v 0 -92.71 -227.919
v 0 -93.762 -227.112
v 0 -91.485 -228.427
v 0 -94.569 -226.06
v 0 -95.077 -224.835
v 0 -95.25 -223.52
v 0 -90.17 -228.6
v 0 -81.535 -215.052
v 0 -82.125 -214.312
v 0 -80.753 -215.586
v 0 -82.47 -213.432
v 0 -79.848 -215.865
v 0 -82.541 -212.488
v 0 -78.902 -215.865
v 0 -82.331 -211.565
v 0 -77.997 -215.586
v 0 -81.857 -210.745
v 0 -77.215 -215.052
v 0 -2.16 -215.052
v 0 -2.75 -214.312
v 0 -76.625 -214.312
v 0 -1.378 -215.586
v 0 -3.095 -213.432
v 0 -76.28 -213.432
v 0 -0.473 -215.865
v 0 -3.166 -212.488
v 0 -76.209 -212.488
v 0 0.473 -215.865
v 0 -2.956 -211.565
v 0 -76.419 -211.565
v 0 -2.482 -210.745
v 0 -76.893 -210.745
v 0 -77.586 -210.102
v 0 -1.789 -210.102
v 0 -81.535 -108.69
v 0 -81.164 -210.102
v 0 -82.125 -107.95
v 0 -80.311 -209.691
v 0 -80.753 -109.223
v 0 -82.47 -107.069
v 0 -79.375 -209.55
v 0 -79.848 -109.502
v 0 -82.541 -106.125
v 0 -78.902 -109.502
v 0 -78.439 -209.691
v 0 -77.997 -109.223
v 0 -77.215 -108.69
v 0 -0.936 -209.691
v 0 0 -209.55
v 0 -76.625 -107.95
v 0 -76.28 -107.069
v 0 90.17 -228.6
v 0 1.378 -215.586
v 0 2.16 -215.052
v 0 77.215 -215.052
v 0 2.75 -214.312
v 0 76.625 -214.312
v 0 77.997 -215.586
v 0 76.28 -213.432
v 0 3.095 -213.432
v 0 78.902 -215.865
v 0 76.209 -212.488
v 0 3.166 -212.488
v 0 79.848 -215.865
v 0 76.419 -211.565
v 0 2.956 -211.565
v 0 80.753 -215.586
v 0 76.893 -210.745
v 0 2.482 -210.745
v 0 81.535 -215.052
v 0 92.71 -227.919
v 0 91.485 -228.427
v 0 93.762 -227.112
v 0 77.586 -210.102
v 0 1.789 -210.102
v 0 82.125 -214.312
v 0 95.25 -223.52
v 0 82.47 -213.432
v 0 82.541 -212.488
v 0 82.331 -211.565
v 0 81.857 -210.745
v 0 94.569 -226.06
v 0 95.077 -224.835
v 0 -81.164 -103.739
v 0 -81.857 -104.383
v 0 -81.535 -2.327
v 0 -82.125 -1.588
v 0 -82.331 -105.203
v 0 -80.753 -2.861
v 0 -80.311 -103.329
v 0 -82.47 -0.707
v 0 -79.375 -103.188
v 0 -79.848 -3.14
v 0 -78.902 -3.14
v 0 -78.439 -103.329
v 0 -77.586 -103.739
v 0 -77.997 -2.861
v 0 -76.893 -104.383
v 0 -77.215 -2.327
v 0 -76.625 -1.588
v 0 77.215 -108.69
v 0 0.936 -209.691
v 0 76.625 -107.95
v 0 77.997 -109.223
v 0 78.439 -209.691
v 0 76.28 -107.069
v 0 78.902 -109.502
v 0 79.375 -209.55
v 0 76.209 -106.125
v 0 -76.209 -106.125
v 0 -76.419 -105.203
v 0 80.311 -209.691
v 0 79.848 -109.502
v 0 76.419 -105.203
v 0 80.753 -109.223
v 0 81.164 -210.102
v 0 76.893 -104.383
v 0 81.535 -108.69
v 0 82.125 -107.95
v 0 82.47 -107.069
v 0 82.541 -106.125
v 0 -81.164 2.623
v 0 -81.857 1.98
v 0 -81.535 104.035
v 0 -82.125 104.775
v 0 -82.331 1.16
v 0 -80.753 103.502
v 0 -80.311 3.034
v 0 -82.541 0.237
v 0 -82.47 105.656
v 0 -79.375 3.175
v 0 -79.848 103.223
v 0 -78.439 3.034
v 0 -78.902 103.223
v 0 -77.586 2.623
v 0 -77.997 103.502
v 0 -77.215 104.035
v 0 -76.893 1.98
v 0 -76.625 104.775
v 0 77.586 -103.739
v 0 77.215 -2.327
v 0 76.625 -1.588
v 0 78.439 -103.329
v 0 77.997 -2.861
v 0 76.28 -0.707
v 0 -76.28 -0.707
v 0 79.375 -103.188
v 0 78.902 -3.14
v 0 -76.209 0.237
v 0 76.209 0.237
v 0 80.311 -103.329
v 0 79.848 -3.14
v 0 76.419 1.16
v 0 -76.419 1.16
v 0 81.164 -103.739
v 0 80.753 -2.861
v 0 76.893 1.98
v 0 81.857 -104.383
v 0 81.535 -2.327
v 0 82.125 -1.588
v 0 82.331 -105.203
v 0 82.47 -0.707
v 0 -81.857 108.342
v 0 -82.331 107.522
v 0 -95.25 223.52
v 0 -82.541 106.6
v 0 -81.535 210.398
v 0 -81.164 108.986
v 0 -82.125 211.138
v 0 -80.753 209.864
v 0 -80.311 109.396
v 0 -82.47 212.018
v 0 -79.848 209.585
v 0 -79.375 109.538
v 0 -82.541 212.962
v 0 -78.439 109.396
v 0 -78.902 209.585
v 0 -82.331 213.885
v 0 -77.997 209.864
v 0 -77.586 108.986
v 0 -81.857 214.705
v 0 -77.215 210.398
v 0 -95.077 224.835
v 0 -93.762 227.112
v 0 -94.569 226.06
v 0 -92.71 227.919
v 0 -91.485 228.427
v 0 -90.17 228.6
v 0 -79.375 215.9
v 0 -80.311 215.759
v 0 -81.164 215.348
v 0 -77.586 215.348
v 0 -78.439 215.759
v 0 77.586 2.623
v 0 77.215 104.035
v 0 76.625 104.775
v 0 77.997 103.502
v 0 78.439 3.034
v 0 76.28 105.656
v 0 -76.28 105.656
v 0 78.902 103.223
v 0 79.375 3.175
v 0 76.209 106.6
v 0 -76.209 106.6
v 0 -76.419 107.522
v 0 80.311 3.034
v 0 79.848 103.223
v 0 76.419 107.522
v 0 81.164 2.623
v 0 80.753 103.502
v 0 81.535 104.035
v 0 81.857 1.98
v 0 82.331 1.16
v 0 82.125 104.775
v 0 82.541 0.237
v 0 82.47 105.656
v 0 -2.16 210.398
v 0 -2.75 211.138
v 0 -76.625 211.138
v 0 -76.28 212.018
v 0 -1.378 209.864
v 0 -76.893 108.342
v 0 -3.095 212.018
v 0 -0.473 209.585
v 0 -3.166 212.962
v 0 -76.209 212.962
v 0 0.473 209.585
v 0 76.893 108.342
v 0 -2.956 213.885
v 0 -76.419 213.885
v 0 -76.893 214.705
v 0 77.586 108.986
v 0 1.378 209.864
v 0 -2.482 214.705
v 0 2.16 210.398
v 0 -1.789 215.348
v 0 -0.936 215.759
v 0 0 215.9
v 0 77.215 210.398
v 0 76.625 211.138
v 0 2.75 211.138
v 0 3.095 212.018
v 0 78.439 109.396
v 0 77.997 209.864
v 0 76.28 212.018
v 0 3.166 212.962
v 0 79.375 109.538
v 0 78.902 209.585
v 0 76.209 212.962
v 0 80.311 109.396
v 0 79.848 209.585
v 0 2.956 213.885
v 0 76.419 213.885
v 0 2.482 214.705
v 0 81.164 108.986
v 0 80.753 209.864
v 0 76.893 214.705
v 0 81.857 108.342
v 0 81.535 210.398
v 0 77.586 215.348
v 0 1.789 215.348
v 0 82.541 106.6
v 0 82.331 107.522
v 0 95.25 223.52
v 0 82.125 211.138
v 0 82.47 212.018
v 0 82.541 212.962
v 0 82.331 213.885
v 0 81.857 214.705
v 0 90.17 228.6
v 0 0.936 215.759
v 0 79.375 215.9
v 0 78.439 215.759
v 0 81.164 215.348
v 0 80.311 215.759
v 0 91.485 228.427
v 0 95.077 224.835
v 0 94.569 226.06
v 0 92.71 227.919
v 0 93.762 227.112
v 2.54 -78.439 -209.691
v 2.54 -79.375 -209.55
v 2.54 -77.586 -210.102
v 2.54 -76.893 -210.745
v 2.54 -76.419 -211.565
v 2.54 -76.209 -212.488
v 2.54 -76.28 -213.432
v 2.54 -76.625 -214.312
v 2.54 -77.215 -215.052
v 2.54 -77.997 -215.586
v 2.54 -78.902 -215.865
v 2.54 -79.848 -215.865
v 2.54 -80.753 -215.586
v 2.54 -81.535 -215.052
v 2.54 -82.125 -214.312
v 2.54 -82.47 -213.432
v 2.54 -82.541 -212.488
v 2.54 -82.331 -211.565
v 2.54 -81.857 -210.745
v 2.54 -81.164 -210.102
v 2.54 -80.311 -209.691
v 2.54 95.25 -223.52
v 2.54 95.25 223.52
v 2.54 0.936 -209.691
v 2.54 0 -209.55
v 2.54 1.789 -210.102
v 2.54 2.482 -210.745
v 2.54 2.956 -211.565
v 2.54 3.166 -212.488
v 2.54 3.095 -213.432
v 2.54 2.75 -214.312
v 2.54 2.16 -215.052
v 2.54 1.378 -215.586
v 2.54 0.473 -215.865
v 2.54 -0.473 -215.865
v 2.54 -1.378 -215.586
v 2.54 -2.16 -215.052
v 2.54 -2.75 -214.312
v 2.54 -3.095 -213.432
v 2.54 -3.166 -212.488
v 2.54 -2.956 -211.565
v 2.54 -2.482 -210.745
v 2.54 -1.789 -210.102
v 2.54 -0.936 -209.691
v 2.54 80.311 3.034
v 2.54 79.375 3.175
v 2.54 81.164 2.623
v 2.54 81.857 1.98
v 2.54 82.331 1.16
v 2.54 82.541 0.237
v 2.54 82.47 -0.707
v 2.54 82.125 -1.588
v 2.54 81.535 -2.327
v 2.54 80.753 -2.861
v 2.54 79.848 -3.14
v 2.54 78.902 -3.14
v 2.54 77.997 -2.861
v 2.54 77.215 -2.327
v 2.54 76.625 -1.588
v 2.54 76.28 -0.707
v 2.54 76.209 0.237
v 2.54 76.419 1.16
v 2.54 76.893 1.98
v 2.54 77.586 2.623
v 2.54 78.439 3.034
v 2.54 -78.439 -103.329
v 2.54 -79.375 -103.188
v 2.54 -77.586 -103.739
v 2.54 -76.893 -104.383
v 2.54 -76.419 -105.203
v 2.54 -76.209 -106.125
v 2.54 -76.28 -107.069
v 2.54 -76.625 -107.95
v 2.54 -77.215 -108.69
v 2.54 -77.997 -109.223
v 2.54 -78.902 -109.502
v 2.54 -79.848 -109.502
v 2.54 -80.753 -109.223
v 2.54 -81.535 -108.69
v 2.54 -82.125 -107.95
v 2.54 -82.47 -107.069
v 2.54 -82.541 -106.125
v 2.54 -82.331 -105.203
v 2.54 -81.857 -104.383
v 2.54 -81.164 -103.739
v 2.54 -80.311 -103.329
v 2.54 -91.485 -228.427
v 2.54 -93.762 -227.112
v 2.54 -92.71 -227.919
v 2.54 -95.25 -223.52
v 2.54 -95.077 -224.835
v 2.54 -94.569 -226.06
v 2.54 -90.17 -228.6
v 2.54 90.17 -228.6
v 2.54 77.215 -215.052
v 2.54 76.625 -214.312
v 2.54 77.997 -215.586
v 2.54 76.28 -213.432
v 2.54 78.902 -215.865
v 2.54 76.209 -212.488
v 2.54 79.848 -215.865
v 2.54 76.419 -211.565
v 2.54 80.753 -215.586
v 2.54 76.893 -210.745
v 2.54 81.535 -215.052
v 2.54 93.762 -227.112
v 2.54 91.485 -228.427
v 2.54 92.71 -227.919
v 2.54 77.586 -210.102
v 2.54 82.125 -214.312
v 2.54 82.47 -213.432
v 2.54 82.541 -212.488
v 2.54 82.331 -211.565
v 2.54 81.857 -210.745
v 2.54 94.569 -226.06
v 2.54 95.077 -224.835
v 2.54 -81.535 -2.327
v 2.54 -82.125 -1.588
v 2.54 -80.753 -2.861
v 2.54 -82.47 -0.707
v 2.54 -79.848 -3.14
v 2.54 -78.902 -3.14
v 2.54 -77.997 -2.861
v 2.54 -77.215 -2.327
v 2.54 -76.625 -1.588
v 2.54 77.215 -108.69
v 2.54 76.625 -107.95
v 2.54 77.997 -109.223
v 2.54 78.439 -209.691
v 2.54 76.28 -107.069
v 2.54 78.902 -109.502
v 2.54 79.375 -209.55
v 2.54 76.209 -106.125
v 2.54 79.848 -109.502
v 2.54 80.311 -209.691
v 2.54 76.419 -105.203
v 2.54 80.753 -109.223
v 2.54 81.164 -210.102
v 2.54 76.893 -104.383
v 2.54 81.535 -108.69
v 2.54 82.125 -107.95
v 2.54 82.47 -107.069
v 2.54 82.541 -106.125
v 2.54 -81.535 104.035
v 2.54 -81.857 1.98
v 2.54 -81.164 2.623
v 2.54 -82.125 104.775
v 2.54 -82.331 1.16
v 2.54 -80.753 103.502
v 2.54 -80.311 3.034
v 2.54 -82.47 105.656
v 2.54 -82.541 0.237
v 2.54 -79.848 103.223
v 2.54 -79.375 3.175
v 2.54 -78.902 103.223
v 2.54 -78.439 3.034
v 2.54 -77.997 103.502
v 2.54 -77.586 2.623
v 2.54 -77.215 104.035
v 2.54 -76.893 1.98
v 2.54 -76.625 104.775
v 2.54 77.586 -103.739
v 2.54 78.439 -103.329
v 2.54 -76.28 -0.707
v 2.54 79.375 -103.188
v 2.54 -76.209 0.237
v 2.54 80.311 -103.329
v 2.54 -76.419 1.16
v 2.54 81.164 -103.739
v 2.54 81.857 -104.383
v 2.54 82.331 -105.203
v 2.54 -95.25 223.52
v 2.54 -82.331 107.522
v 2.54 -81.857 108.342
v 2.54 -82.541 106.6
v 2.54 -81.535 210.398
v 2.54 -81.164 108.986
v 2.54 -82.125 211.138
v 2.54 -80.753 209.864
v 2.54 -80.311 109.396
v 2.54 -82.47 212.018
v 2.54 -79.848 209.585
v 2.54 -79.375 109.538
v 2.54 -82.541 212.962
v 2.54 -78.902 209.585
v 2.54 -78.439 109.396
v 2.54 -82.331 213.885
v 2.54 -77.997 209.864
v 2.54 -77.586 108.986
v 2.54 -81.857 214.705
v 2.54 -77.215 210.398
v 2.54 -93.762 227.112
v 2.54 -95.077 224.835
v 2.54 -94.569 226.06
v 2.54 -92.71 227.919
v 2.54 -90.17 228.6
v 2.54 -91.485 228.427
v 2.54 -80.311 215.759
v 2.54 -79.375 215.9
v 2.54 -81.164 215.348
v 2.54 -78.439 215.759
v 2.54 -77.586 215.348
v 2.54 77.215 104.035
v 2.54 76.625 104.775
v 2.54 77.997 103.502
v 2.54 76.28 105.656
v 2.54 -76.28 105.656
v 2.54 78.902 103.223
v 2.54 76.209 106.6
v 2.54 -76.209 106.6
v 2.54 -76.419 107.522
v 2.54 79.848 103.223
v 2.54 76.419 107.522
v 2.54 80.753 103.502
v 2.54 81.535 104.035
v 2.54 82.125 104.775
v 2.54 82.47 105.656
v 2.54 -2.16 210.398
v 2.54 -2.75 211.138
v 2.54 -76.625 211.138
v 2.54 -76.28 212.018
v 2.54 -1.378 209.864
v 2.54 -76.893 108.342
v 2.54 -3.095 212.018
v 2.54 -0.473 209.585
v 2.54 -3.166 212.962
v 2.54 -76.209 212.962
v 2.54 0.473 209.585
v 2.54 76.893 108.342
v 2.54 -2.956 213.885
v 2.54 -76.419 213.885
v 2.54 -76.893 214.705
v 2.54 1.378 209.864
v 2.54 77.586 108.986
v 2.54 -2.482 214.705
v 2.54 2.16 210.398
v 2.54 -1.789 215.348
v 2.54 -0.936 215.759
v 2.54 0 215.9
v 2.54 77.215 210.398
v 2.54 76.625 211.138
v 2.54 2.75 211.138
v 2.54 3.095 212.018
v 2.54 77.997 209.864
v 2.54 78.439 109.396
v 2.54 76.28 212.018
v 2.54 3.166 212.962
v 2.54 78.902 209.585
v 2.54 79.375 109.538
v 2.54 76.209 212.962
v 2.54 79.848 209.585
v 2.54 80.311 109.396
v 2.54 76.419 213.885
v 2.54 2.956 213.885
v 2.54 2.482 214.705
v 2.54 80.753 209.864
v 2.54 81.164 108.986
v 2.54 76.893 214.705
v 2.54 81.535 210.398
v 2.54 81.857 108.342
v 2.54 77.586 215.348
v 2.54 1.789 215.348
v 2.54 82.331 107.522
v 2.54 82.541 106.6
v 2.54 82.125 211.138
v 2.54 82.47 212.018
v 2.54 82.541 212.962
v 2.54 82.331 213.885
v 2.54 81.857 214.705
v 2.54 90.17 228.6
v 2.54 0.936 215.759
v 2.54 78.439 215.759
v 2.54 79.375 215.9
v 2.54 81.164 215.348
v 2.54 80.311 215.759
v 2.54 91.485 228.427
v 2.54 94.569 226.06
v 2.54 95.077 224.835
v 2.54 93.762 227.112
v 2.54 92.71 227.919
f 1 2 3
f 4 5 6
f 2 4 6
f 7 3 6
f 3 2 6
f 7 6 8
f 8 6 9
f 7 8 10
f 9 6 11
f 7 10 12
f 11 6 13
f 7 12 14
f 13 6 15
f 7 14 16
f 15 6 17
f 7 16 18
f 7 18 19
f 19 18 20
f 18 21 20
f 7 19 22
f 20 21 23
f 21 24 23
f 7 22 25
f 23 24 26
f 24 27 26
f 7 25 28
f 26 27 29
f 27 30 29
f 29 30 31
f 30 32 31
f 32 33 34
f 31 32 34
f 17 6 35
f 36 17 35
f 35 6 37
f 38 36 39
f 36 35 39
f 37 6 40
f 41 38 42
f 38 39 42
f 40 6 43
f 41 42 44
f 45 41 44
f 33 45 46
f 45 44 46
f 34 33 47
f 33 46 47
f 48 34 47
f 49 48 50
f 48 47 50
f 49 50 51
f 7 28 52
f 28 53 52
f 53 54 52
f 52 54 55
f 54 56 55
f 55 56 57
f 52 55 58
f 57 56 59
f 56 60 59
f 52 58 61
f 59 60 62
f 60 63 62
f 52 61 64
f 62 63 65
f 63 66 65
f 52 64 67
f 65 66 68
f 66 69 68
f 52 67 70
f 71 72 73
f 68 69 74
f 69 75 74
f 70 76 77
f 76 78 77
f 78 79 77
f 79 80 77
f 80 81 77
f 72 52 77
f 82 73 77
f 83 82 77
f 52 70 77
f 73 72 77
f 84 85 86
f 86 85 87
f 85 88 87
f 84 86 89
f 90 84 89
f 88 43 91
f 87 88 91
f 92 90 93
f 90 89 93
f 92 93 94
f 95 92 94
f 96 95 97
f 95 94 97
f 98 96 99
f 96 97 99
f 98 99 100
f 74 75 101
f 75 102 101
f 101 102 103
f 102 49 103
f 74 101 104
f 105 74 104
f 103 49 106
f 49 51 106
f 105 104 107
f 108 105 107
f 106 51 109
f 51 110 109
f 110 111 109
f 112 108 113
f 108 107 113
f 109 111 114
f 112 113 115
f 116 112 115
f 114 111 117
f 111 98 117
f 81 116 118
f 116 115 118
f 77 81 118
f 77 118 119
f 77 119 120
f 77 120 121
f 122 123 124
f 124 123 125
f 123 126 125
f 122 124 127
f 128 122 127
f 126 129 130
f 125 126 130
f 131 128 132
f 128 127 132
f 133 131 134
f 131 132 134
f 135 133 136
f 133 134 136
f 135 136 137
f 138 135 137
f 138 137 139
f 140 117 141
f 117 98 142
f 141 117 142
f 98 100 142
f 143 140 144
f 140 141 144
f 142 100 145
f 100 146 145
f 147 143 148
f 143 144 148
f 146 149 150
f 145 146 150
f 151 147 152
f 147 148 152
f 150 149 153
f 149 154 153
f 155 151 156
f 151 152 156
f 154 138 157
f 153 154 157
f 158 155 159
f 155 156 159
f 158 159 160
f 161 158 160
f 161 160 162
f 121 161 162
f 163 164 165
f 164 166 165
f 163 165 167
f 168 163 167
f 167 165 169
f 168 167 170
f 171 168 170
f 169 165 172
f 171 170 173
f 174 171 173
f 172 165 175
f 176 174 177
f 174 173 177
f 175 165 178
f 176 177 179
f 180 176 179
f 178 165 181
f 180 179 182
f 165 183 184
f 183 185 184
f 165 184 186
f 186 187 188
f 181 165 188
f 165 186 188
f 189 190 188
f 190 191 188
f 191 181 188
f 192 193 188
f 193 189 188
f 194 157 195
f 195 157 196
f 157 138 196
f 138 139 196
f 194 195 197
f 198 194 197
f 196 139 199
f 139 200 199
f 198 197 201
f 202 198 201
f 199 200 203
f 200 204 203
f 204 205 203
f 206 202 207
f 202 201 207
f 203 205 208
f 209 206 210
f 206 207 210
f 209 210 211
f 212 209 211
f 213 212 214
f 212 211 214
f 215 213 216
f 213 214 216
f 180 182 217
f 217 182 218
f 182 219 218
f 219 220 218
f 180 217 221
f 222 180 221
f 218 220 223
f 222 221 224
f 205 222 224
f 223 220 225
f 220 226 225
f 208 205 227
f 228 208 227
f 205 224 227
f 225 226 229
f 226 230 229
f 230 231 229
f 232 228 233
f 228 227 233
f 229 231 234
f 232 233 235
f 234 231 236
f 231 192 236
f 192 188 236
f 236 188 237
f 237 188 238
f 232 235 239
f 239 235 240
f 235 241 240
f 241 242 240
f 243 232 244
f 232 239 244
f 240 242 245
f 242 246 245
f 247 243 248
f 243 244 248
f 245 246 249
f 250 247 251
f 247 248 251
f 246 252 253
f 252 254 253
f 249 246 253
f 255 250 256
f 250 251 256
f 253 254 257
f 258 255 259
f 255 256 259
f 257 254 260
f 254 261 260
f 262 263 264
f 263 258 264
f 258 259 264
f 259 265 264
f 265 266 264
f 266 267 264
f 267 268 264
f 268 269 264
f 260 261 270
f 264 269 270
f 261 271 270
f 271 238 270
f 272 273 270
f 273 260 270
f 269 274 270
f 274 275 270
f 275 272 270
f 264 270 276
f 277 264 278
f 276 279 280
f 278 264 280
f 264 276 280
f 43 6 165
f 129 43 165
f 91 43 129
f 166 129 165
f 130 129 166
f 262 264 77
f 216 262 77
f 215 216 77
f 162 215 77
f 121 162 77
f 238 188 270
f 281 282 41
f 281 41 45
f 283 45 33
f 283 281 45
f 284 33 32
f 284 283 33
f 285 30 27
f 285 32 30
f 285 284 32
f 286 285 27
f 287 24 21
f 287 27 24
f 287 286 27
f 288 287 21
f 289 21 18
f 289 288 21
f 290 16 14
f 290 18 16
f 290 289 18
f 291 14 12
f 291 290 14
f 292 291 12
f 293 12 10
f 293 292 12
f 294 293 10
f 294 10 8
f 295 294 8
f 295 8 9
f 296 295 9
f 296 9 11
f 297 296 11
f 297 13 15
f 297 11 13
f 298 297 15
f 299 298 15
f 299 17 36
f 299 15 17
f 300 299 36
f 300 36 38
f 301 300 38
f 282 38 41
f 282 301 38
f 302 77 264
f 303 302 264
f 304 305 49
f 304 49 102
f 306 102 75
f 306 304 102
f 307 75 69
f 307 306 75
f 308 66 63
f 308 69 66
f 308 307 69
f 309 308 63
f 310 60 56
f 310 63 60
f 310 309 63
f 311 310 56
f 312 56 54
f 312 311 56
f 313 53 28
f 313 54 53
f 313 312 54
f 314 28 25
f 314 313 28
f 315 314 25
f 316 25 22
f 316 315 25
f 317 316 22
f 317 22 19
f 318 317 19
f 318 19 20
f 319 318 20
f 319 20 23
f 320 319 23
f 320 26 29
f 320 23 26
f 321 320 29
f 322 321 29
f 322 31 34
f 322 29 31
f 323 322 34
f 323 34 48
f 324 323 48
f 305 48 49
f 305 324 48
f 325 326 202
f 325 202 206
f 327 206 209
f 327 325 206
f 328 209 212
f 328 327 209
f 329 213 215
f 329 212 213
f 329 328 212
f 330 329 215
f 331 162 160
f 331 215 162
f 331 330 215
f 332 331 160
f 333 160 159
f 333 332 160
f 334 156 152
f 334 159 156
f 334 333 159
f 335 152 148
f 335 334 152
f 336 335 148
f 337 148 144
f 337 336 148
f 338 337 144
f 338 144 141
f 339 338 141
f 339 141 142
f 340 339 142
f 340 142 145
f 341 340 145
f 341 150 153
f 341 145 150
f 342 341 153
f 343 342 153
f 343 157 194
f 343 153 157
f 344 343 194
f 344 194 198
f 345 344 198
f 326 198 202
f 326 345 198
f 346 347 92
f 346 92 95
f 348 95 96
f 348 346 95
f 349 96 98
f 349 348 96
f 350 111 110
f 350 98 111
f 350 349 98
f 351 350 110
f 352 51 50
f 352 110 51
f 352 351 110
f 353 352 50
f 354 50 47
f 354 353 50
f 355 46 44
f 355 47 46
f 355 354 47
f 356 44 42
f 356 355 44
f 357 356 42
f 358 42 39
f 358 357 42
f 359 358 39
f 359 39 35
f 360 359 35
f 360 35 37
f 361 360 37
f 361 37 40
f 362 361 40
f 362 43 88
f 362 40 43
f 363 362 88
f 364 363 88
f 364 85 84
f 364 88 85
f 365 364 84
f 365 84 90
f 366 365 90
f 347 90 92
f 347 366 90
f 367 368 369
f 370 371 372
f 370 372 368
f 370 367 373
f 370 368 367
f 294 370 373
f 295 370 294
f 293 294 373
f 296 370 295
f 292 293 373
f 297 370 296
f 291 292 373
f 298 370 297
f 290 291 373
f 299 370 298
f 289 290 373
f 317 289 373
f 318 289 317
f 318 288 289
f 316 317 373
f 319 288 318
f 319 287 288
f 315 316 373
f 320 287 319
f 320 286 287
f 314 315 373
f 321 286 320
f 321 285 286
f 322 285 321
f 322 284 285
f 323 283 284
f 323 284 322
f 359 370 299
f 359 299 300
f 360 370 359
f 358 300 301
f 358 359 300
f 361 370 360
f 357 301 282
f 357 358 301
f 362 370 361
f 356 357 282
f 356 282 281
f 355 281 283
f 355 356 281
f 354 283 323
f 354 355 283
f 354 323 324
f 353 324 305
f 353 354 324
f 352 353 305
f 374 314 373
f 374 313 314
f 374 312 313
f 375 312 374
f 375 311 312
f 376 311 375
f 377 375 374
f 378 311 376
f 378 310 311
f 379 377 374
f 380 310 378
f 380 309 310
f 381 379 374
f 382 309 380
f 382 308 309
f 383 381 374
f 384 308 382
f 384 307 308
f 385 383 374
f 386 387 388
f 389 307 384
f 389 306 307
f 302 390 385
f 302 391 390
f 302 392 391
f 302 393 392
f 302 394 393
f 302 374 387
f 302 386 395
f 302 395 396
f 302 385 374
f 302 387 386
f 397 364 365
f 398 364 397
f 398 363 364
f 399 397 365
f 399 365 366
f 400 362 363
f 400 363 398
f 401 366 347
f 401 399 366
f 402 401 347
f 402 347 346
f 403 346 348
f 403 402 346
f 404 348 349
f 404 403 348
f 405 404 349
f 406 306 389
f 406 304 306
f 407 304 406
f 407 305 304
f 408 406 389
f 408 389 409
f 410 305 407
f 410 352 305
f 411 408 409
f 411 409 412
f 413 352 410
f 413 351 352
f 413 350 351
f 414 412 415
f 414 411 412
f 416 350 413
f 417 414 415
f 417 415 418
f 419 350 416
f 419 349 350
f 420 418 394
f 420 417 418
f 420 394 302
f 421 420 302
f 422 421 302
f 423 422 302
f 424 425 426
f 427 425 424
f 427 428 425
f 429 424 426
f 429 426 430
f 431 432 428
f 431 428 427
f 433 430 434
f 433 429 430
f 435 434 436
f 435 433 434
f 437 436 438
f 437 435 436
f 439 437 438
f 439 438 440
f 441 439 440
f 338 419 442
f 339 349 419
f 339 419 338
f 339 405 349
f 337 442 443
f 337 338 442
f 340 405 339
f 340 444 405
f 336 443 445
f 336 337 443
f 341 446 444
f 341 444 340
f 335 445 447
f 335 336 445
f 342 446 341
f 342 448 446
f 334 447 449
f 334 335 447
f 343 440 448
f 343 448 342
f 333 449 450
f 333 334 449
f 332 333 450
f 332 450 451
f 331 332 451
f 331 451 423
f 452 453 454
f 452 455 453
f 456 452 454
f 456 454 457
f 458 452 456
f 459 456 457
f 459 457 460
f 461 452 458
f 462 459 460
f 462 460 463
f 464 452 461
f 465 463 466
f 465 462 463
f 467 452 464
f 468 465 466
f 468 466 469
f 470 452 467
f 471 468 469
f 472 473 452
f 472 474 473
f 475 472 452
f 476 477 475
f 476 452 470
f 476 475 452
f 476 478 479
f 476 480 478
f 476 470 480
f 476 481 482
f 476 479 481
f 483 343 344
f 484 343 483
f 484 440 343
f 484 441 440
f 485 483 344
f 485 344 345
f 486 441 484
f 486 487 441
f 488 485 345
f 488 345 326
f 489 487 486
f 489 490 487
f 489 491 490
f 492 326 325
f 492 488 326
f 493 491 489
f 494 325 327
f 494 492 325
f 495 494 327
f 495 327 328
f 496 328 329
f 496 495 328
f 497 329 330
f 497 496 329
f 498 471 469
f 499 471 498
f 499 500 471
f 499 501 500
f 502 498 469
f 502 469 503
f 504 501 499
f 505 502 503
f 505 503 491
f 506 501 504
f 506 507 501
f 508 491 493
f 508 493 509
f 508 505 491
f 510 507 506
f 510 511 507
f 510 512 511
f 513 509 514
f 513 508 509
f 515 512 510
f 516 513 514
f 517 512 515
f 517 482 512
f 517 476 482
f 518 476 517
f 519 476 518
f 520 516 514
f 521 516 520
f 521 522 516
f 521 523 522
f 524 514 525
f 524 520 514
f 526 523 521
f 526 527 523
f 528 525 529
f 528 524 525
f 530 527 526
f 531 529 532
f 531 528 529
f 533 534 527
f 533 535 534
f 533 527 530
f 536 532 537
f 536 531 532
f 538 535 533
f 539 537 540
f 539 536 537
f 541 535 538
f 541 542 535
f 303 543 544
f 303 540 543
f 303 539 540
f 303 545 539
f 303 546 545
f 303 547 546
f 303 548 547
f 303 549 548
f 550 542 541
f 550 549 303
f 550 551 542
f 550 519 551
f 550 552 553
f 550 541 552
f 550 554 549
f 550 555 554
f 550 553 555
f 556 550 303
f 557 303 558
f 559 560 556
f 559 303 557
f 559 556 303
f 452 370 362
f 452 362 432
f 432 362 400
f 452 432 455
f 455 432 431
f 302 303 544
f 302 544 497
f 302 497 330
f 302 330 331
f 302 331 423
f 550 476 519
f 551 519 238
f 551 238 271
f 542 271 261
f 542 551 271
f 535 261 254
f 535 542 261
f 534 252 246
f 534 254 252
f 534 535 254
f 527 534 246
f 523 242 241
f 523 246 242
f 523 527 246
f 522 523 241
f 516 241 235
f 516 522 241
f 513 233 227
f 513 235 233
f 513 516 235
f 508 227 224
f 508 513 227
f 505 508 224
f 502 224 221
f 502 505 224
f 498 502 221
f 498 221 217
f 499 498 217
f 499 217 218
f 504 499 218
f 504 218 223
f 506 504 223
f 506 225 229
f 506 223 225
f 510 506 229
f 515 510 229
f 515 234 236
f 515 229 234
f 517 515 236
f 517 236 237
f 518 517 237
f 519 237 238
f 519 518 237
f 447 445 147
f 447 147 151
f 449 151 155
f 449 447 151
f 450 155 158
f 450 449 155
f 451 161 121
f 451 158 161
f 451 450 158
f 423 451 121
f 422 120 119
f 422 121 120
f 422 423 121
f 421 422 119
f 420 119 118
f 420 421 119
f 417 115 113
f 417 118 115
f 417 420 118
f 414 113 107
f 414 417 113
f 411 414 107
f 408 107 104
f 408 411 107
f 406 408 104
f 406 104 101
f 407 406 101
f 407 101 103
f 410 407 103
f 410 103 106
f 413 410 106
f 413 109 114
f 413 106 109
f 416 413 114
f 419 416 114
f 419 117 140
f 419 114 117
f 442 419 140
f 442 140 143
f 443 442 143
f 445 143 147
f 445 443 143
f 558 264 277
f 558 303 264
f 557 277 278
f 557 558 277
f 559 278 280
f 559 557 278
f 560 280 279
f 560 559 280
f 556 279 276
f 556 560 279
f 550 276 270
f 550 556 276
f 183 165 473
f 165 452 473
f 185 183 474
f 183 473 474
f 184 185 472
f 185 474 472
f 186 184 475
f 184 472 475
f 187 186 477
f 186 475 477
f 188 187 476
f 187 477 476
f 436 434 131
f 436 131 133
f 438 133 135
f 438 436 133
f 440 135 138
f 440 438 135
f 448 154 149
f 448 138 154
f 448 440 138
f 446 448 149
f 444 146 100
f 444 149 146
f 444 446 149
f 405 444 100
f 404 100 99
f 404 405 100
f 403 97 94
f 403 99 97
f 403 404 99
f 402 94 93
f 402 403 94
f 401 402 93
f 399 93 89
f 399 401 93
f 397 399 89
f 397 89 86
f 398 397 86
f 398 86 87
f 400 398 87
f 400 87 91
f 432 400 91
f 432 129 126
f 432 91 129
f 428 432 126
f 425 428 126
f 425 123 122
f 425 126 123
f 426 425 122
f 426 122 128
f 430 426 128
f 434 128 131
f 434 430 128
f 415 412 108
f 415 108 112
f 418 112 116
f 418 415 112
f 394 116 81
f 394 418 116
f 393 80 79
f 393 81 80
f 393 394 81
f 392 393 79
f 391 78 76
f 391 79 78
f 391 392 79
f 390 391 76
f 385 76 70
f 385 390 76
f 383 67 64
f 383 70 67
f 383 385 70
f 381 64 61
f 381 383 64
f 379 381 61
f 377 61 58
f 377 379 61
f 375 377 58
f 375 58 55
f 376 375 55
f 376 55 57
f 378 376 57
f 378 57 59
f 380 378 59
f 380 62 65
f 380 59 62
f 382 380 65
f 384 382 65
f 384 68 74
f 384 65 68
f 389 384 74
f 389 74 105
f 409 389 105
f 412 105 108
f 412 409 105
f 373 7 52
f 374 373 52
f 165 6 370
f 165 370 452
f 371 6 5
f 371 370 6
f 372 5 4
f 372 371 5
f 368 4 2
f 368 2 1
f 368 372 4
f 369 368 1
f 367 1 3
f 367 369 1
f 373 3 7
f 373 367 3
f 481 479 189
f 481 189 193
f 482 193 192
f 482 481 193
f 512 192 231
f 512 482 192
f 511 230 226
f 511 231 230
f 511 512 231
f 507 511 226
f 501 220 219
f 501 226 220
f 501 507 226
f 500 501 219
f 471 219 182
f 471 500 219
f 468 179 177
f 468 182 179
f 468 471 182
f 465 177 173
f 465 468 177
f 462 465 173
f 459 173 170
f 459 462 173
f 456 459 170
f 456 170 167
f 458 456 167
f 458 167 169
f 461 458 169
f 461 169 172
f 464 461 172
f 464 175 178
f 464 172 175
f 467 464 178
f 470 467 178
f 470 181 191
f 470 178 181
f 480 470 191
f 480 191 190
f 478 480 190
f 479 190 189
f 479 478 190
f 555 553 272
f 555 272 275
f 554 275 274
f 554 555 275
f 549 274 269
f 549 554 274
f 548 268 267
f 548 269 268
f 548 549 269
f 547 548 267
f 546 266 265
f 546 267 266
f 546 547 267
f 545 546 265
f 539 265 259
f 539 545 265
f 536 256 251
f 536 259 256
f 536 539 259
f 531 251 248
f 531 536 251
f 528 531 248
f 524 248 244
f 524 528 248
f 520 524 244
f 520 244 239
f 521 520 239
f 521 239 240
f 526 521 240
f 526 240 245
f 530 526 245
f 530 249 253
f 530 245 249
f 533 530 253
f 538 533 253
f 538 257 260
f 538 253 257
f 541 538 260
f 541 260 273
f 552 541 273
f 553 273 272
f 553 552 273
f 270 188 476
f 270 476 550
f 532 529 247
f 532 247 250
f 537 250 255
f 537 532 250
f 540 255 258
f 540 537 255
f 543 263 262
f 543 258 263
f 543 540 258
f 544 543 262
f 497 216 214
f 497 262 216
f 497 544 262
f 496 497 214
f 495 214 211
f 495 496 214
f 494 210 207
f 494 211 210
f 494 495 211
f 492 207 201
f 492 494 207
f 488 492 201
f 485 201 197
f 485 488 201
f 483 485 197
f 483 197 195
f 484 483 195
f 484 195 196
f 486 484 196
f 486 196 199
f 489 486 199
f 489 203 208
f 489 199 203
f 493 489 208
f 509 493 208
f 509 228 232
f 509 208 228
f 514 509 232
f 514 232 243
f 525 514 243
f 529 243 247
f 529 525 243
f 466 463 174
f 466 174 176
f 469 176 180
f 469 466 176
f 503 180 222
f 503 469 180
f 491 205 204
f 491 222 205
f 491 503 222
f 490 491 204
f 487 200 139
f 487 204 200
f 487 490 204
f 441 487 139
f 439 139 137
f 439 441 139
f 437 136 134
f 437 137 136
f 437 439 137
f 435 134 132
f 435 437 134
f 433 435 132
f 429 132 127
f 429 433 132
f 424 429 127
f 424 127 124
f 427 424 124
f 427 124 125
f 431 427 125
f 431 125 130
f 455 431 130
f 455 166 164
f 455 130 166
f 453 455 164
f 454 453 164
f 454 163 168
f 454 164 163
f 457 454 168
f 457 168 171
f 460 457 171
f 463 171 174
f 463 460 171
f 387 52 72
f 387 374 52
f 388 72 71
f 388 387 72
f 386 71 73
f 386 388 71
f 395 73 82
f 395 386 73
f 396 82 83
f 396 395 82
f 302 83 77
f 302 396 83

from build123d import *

# Parameters (mm, degrees)
SKETCH1_W               = 190.5
SKETCH1_H               = 457.2
BOSS_EXTRUDE1_DEPTH     = 2.54
FILLET1_R               = 5.08
CUT_EXTRUDE1_DEPTH      = 248.663025298
CUT_EXTRUDE1_DEPTH_BACK = 248.663025298
SKETCH2_R               = 3.175


with BuildPart() as part:
    # Sketch1 → Boss-Extrude1 (new body)
    with BuildSketch(Plane.YZ):
        Rectangle(SKETCH1_W, SKETCH1_H)
    extrude(amount=BOSS_EXTRUDE1_DEPTH)

    # Fillet1
    fillet1_edges = [part.edges().sort_by_distance(p)[0] for p in [
        (1.27, 95.25, -228.6),
        (1.27, -95.25, -228.6),
        (1.27, -95.25, 228.6),
        (1.27, 95.25, 228.6),
    ]]
    fillet(fillet1_edges, radius=FILLET1_R)

    # Sketch2 → Cut-Extrude1 (cut, two sides: drawn at the far end of the back side and taken through both)
    with BuildSketch(Plane.ZY.offset(-CUT_EXTRUDE1_DEPTH_BACK)):
        with Locations((-257.175, 0)):
            Circle(SKETCH2_R)
        with Locations((-106.3625, -79.375)):
            Circle(SKETCH2_R)
        with Locations((0, -79.375)):
            Circle(SKETCH2_R)
        with Locations((106.3625, -79.375)):
            Circle(SKETCH2_R)
        with Locations((212.725, -79.375)):
            Circle(SKETCH2_R)
        with Locations((212.725, 79.375)):
            Circle(SKETCH2_R)
        with Locations((212.725, 0)):
            Circle(SKETCH2_R)
        with Locations((-257.175, -79.375)):
            Circle(SKETCH2_R)
        with Locations((-363.5375, -79.375)):
            Circle(SKETCH2_R)
        with Locations((-257.175, 79.375)):
            Circle(SKETCH2_R)
        with Locations((-106.3625, 79.375)):
            Circle(SKETCH2_R)
        with Locations((-212.725, 79.375)):
            Circle(SKETCH2_R)
        with Locations((-212.725, 0)):
            Circle(SKETCH2_R)
        with Locations((-212.725, -79.375)):
            Circle(SKETCH2_R)
        with Locations((-576.2625, -79.375)):
            Circle(SKETCH2_R)
        with Locations((-469.9, -79.375)):
            Circle(SKETCH2_R)
        with Locations((106.3625, 79.375)):
            Circle(SKETCH2_R)
        with Locations((0, 79.375)):
            Circle(SKETCH2_R)
        with Locations((-682.625, 79.375)):
            Circle(SKETCH2_R)
        with Locations((-576.2625, 79.375)):
            Circle(SKETCH2_R)
        with Locations((-682.625, -79.375)):
            Circle(SKETCH2_R)
        with Locations((-469.9, 79.375)):
            Circle(SKETCH2_R)
        with Locations((-682.625, 0)):
            Circle(SKETCH2_R)
        with Locations((-363.5375, 79.375)):
            Circle(SKETCH2_R)
        with Locations((-831.85, -79.375)):
            Circle(SKETCH2_R)
        with Locations((-831.85, 79.375)):
            Circle(SKETCH2_R)
        with Locations((-727.075, 79.375)):
            Circle(SKETCH2_R)
        with Locations((-727.075, -79.375)):
            Circle(SKETCH2_R)
        with Locations((-936.625, 0)):
            Circle(SKETCH2_R)
        with Locations((-727.075, 0)):
            Circle(SKETCH2_R)
        with Locations((-936.625, 79.375)):
            Circle(SKETCH2_R)
        with Locations((-936.625, -79.375)):
            Circle(SKETCH2_R)
    extrude(amount=CUT_EXTRUDE1_DEPTH + CUT_EXTRUDE1_DEPTH_BACK, mode=Mode.SUBTRACT)


solid = part.part
